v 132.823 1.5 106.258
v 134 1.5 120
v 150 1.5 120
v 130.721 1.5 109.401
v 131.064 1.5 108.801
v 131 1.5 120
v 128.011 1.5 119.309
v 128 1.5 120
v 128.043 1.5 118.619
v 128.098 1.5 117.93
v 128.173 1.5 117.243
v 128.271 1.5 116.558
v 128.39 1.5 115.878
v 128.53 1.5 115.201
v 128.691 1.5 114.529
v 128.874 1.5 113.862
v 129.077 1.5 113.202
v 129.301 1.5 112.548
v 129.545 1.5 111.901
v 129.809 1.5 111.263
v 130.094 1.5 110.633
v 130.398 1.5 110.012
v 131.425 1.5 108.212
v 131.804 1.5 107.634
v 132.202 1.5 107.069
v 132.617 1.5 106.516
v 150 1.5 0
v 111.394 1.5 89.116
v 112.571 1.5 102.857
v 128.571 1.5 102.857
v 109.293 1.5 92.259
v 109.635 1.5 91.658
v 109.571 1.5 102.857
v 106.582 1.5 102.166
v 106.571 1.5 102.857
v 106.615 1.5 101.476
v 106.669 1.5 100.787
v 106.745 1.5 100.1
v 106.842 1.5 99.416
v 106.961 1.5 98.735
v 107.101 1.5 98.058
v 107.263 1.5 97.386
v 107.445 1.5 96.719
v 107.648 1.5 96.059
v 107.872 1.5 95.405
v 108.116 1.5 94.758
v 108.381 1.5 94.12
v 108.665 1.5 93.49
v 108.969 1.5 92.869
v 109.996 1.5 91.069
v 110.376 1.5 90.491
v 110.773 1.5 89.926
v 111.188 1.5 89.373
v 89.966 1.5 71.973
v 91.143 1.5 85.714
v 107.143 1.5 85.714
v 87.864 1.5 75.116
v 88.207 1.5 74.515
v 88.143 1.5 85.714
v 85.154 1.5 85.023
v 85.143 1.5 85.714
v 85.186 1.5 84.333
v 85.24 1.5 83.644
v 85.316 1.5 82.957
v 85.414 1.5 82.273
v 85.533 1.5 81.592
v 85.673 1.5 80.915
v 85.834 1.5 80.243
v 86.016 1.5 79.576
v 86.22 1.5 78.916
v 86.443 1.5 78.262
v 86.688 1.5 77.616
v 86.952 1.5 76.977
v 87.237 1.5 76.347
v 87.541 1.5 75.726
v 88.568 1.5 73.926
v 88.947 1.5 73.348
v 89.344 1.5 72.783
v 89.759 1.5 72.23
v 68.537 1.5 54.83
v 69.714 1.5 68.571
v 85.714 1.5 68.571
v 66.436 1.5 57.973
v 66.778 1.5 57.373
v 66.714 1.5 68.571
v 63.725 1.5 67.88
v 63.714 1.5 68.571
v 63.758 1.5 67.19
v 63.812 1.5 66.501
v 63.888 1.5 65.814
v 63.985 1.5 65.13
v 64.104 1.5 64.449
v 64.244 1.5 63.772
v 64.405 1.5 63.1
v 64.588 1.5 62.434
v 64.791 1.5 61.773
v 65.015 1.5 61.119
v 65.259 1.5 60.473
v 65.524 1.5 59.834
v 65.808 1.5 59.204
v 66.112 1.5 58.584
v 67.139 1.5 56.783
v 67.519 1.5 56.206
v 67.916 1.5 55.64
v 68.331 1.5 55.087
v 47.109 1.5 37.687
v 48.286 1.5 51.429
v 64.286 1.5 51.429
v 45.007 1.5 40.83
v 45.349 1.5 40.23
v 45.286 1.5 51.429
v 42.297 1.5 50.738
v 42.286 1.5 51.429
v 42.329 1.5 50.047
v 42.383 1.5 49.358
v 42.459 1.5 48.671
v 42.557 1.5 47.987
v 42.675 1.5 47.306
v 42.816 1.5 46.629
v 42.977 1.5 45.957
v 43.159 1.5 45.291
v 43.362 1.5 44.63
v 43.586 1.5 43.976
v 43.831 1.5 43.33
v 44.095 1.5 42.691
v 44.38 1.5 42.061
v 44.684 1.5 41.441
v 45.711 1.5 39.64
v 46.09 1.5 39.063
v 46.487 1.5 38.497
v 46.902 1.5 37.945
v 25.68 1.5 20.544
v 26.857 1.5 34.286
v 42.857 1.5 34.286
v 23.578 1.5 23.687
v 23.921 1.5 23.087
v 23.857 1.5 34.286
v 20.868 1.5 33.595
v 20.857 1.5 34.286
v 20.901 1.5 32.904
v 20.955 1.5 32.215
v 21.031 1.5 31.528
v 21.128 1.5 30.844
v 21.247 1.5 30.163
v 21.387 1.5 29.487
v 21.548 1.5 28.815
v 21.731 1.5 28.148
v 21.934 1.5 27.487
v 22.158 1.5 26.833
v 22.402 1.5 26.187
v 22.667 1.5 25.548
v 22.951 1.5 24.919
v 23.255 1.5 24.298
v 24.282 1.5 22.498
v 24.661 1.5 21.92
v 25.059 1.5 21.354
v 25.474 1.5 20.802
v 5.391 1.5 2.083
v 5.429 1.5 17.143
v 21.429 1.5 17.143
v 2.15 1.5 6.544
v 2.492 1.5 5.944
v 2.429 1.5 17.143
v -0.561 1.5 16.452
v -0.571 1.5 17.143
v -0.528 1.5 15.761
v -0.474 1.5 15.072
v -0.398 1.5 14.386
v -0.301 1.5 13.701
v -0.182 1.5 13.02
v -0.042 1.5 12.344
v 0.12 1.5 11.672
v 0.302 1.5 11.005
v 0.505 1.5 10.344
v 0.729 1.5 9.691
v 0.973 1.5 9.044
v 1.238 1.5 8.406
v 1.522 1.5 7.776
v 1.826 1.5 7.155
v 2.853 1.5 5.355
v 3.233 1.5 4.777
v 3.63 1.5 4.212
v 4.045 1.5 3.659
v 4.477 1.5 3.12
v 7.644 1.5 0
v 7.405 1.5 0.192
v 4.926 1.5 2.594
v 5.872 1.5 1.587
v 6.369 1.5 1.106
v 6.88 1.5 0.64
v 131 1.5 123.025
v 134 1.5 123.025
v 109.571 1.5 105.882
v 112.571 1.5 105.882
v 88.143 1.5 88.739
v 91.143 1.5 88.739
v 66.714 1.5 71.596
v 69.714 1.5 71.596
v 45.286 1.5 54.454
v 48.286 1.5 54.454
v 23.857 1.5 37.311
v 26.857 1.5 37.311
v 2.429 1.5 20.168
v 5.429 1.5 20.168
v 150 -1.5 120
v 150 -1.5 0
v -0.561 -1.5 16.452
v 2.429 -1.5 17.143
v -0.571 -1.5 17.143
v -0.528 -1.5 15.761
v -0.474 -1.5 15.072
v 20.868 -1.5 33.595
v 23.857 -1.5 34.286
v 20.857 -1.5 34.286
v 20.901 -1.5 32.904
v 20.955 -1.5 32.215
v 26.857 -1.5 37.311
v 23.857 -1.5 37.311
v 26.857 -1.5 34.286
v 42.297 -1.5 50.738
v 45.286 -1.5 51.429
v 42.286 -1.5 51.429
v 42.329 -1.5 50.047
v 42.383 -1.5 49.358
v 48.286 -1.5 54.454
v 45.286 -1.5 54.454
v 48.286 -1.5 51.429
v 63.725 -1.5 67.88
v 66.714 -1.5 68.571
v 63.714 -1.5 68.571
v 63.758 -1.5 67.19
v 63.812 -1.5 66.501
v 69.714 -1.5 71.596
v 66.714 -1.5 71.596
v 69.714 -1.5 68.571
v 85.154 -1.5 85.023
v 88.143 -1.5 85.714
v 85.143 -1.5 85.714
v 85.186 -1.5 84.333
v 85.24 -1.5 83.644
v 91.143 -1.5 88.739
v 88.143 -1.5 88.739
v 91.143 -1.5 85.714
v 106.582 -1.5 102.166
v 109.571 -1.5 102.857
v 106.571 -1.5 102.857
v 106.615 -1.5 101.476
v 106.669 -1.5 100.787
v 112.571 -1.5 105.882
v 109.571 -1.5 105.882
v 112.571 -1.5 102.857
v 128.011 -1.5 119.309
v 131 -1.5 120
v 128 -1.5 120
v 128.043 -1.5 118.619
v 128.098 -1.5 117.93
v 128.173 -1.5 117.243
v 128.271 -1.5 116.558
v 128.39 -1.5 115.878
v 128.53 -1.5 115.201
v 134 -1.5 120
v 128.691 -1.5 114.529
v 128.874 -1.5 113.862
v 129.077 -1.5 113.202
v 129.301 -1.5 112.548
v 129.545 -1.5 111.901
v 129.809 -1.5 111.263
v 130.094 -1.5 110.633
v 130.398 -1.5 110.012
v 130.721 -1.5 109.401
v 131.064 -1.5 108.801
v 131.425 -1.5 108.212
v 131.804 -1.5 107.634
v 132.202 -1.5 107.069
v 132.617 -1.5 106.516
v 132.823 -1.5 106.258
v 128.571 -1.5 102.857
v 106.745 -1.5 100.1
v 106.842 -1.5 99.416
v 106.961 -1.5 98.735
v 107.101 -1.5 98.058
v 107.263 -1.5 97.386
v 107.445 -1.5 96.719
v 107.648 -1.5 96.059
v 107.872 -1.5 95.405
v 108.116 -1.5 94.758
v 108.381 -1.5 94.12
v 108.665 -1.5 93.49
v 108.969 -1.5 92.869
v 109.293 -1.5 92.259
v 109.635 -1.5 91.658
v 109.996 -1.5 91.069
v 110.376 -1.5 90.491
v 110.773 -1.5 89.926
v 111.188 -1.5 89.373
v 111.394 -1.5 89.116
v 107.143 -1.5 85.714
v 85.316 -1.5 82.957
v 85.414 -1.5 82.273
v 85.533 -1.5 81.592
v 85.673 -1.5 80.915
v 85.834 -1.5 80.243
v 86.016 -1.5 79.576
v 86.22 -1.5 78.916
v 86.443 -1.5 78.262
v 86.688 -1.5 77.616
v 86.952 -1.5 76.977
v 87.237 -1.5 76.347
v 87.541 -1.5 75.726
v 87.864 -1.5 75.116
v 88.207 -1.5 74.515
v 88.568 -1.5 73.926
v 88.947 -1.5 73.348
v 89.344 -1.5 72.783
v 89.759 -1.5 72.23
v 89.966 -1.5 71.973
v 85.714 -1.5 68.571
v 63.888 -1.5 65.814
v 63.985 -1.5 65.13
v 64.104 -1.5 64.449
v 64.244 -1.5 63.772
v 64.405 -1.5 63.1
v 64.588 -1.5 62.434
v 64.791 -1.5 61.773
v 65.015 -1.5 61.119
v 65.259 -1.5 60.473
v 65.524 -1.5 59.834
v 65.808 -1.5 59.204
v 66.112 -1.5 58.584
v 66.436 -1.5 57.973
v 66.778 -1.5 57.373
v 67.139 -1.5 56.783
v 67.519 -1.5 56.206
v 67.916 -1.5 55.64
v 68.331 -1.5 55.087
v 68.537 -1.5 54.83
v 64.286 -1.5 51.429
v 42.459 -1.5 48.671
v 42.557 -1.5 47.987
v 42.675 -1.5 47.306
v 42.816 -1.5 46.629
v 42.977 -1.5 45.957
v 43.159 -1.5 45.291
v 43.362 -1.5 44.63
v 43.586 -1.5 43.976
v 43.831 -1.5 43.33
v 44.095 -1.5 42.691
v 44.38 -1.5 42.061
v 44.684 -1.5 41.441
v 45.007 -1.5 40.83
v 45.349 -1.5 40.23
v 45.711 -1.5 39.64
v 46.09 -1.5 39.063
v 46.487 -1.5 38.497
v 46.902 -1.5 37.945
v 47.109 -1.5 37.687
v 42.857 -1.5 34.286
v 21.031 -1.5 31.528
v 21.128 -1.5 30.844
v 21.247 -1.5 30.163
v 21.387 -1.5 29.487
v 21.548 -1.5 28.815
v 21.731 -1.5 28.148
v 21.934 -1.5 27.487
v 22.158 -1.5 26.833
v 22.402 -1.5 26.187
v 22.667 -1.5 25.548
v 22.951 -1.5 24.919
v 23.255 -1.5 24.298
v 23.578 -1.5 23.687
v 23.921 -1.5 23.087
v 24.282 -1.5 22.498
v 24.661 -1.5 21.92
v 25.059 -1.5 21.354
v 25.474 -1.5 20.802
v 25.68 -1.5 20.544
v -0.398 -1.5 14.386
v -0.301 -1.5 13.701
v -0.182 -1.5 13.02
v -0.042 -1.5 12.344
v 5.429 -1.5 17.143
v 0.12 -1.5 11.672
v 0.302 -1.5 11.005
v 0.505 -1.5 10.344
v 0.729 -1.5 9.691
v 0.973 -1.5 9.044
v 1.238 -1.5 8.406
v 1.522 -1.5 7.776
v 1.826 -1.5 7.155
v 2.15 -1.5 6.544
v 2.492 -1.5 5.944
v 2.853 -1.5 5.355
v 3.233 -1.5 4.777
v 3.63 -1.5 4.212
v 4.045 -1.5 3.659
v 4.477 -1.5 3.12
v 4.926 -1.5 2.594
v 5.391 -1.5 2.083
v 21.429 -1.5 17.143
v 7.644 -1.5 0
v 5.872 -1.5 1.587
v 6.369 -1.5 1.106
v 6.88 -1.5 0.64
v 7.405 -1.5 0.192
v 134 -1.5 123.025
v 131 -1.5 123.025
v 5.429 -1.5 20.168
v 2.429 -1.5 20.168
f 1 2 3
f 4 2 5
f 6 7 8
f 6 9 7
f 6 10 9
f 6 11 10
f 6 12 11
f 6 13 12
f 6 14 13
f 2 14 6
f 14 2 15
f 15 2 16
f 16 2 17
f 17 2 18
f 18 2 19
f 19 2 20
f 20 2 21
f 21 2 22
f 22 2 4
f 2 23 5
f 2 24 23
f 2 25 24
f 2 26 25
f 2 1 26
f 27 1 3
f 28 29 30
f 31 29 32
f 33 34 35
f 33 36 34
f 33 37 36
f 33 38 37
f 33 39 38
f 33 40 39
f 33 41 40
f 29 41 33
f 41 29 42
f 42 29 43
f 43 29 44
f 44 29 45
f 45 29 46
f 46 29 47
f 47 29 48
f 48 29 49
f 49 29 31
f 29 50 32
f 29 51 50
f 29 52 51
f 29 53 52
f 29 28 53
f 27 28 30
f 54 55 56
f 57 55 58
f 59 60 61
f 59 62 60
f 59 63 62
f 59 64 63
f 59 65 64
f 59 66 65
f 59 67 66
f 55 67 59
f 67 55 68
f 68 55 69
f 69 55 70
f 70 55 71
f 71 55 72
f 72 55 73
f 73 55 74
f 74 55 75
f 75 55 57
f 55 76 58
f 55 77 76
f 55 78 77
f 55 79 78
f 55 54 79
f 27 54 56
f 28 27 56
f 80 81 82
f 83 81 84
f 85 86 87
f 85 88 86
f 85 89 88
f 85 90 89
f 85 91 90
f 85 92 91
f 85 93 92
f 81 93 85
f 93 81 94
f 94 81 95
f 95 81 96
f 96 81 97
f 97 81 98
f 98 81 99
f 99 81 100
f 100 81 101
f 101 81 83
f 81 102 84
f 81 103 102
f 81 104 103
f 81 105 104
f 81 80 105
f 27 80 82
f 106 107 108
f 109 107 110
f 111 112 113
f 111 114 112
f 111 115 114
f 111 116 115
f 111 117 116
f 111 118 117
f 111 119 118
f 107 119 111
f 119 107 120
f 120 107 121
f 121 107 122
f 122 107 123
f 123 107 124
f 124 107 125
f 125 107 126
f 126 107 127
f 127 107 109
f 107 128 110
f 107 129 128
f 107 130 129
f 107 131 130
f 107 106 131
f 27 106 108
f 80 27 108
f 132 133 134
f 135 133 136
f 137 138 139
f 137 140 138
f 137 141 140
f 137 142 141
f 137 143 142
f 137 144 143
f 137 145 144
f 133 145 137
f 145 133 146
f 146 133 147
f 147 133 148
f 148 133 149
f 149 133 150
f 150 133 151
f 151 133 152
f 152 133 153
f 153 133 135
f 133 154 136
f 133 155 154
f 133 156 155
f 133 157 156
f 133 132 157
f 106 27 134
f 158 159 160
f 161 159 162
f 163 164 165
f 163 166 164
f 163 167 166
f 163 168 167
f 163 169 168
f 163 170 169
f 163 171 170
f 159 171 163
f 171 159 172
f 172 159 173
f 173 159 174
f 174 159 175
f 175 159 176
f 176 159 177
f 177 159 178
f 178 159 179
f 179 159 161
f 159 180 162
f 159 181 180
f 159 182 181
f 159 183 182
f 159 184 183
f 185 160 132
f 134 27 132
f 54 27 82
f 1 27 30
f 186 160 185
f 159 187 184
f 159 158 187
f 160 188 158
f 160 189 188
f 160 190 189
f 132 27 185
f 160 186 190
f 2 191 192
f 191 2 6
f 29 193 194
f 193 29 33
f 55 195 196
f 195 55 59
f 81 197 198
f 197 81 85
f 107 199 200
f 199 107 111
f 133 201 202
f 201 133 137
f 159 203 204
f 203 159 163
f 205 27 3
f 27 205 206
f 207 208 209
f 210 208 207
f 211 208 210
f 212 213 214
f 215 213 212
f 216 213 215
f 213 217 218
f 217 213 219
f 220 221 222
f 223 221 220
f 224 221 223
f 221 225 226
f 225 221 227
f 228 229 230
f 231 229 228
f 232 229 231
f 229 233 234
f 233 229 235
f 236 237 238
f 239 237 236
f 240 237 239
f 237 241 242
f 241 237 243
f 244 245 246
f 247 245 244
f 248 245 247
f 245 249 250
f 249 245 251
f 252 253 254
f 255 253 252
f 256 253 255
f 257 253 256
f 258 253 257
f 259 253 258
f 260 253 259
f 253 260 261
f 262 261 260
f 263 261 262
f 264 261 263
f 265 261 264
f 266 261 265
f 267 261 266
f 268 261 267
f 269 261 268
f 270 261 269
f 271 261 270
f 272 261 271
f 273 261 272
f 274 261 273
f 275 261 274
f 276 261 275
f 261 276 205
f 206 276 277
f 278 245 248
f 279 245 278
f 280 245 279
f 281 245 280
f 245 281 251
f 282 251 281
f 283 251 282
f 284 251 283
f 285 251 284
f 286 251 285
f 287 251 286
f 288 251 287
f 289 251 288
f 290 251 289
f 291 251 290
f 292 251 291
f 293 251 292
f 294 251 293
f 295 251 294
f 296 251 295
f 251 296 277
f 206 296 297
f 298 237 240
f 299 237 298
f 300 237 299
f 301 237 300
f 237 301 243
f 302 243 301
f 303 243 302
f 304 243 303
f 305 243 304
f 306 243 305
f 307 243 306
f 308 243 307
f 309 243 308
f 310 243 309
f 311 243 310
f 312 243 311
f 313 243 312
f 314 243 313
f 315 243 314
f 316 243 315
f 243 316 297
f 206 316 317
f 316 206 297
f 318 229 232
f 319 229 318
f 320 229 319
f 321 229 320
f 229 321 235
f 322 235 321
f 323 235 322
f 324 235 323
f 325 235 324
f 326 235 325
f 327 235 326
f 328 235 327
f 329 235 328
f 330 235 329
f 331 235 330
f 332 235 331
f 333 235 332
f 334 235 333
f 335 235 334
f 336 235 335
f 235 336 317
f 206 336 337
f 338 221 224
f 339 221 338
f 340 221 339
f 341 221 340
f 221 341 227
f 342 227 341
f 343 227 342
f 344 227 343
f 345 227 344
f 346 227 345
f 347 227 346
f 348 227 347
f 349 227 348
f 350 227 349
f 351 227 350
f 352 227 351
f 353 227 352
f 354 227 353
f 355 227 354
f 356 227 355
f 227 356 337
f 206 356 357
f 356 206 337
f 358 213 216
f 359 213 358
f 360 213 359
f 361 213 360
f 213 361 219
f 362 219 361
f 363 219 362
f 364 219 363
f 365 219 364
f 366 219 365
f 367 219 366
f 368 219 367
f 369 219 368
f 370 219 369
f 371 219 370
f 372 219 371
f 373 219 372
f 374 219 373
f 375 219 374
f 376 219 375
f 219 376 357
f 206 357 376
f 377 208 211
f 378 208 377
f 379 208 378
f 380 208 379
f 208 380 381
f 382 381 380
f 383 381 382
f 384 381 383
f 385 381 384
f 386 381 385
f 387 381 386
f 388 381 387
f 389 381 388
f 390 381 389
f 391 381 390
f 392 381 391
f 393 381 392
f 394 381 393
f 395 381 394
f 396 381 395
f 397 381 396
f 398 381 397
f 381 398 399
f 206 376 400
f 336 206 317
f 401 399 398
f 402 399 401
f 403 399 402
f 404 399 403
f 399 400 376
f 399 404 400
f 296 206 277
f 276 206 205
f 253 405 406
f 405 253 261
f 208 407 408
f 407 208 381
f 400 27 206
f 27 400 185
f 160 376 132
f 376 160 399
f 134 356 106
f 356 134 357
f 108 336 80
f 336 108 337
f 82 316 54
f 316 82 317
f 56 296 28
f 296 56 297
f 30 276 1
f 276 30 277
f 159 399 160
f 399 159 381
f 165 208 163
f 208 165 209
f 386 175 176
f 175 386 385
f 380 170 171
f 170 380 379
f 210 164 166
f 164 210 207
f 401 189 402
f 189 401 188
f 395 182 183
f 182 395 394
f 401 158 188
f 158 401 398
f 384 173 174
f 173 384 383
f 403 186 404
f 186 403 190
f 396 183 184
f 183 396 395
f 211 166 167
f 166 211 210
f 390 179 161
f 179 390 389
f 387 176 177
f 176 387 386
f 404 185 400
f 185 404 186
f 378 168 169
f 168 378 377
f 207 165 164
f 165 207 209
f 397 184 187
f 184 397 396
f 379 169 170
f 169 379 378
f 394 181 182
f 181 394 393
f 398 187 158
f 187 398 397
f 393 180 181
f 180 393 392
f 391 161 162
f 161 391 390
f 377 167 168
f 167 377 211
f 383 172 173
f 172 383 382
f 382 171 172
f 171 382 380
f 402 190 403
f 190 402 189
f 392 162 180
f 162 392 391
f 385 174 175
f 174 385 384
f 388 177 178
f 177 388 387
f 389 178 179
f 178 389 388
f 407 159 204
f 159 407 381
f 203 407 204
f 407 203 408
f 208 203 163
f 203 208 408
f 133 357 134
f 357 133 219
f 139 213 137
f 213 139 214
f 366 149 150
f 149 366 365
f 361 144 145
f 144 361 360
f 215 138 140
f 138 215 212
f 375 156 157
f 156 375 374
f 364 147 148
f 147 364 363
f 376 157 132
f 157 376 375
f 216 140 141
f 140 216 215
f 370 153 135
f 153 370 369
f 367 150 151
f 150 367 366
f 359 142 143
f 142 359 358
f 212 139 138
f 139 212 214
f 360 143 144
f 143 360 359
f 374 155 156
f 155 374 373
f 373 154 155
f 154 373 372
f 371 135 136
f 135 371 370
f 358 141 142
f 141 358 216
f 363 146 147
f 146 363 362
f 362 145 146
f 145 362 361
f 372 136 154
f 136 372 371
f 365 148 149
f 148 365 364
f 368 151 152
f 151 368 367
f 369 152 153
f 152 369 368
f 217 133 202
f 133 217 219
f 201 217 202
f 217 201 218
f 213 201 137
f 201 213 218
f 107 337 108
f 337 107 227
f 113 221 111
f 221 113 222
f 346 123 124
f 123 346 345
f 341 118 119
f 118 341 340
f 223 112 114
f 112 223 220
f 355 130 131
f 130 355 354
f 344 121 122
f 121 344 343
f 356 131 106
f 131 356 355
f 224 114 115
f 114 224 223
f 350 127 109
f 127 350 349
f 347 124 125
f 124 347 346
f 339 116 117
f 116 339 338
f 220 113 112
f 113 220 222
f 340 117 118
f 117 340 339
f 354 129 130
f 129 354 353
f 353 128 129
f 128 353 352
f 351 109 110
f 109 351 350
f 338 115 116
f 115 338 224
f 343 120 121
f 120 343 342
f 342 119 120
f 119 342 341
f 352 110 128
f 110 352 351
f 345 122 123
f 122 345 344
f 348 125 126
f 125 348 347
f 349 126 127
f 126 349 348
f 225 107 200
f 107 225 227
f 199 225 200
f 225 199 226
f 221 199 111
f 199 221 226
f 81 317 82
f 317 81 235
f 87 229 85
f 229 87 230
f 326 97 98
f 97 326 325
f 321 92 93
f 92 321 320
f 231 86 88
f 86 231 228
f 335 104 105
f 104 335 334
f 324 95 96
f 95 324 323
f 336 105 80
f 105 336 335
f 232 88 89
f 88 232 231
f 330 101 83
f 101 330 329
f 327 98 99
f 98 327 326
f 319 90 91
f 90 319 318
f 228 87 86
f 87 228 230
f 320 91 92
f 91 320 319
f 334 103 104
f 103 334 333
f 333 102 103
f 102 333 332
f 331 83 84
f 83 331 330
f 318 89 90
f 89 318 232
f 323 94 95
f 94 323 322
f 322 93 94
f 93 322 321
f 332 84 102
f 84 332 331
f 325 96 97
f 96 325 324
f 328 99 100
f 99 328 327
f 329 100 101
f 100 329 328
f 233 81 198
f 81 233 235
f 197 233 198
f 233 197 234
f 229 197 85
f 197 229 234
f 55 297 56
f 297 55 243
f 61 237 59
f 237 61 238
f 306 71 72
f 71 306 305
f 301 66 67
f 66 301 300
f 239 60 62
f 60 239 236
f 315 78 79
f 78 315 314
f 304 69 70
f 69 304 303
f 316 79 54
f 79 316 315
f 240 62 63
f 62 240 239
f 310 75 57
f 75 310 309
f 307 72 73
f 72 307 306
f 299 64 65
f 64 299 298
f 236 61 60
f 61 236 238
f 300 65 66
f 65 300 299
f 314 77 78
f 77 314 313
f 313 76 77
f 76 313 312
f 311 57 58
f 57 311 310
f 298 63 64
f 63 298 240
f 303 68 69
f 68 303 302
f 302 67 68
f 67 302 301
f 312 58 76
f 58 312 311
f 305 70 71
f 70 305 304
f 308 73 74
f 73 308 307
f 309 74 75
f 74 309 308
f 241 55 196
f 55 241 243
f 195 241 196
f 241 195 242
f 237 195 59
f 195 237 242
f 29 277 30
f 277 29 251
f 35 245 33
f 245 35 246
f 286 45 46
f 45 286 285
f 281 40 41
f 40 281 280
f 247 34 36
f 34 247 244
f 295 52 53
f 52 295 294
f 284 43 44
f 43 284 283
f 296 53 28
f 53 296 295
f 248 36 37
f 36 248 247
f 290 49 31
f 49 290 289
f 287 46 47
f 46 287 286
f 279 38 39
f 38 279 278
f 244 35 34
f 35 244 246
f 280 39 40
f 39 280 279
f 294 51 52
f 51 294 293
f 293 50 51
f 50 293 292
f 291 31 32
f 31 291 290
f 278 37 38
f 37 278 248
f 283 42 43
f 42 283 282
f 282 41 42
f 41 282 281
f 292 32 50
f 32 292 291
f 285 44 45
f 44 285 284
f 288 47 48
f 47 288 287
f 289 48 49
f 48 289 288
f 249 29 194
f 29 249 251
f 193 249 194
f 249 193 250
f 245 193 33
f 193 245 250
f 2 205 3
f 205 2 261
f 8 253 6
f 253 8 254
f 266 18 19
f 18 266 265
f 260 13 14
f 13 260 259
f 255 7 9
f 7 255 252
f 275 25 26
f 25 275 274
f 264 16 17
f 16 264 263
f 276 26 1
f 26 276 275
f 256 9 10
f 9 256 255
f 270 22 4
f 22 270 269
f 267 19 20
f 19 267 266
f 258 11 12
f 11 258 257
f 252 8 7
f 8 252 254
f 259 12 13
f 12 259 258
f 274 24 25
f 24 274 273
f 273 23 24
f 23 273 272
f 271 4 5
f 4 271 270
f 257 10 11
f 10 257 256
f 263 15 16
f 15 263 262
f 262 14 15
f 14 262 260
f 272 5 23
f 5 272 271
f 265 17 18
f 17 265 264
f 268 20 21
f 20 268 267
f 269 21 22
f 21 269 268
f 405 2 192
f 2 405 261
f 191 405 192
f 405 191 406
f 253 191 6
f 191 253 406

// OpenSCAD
// file: step.scad
include <config.scad>;

module step_positive()
{
    color(step_color)
    translate([
        -step_x/2,
        0,
        material_z/2
        ])
    cube([
        step_x,
        step_y,
        material_z
        ], center=true);
}

module step()
{
    difference()
    {
        step_positive();

        // right side nose cutout
        translate([
            -step_support_radius + material_z*3/2,,
            -step_y/2 + stairs_support_inset,
            material_z/2
            ])
        cube([
            material_z,
            material_z,
            material_z*1.2
            ], center=true);

        // left side nose cutout
        translate([
            -step_support_radius + material_z*3/2,,
            +step_y/2 - stairs_support_inset,
            material_z/2
            ])
        cube([
            material_z,
            material_z,
            material_z*1.2
            ], center=true);
    }
}

module step_support_cylinder()
{
    intersection()
    {
        // lower left quadrant of the xz-plane
        translate([
            -stairs_x/2,
            0,
            -stairs_z/2
            ])
        cube([
            stairs_x,
            material_z,
            stairs_z
            ], center=true);

        // cylinder
        rotate([
            90,
            0,
            0
            ])
        cylinder(
            r=step_support_radius,
            h=material_z,
            center=true
            );
    }
}

module step_support()
{
    color(support_color)
    {
        step_support_cylinder();

        // nose
        translate([
            -step_support_radius + material_z*3/2,
            0,
            material_z/2
            ])
        cube([
            material_z,
            material_z,
            material_z + nothing
            ], center=true);
    }
}

step();

/*
translate([
    0,
    -step_y/2 + stairs_support_inset,
    0
    ])
step_support();
*/
// file: config.scad
/**
 * All measures in millimeters.
 */

$fn = 200;
nothing = 0.05;

material_z = 3;

stairs_x = 150;
stairs_z = 120;

step_count = 7;
step_x = 25;
step_y = 60;
step_support_radius = step_x - material_z;

stairs_support_inset = 8;

step_color = "brown";
support_color = "yellow";
// main file
include <config.scad>;
use <step.scad>;

module support_triangle()
{
    // rotate into xz-plane
    rotate([
        90,
        0,
        0
        ])
    // make 3d
    linear_extrude(material_z, center=true)
    // triangle
    polygon([
        [0, 0],
        [stairs_x, 0],
        [stairs_x, stairs_z]
        ]);
}

module support_triangle_without_corner()
{
    difference()
    {
        support_triangle();

        translate([
            stairs_x/(step_count*4),
            0,
            stairs_z/2 - nothing
            ])
        cube([
            stairs_x/(2*step_count),
            material_z*1.2,
            stairs_z
            ], center=true);
    }
}

module support_with_step_supports()
{
    // begin with a triangle
    support_triangle_without_corner();

    // add step supports
    for (i=[1:step_count])
    {
        translate([
            i*stairs_x/step_count,
            0,
            i*stairs_z/step_count
            ])
        step_support();
    }
}

module support()
{
    color(support_color)
    intersection()
    {
        support_with_step_supports();

        // upper right quadrant of the xz-plane
        translate([
            0,
            0,
            +stairs_z
            ])
        cube([
            2*stairs_x,
            material_z,
            2*stairs_z
            ], center=true);
    }
}

support();
